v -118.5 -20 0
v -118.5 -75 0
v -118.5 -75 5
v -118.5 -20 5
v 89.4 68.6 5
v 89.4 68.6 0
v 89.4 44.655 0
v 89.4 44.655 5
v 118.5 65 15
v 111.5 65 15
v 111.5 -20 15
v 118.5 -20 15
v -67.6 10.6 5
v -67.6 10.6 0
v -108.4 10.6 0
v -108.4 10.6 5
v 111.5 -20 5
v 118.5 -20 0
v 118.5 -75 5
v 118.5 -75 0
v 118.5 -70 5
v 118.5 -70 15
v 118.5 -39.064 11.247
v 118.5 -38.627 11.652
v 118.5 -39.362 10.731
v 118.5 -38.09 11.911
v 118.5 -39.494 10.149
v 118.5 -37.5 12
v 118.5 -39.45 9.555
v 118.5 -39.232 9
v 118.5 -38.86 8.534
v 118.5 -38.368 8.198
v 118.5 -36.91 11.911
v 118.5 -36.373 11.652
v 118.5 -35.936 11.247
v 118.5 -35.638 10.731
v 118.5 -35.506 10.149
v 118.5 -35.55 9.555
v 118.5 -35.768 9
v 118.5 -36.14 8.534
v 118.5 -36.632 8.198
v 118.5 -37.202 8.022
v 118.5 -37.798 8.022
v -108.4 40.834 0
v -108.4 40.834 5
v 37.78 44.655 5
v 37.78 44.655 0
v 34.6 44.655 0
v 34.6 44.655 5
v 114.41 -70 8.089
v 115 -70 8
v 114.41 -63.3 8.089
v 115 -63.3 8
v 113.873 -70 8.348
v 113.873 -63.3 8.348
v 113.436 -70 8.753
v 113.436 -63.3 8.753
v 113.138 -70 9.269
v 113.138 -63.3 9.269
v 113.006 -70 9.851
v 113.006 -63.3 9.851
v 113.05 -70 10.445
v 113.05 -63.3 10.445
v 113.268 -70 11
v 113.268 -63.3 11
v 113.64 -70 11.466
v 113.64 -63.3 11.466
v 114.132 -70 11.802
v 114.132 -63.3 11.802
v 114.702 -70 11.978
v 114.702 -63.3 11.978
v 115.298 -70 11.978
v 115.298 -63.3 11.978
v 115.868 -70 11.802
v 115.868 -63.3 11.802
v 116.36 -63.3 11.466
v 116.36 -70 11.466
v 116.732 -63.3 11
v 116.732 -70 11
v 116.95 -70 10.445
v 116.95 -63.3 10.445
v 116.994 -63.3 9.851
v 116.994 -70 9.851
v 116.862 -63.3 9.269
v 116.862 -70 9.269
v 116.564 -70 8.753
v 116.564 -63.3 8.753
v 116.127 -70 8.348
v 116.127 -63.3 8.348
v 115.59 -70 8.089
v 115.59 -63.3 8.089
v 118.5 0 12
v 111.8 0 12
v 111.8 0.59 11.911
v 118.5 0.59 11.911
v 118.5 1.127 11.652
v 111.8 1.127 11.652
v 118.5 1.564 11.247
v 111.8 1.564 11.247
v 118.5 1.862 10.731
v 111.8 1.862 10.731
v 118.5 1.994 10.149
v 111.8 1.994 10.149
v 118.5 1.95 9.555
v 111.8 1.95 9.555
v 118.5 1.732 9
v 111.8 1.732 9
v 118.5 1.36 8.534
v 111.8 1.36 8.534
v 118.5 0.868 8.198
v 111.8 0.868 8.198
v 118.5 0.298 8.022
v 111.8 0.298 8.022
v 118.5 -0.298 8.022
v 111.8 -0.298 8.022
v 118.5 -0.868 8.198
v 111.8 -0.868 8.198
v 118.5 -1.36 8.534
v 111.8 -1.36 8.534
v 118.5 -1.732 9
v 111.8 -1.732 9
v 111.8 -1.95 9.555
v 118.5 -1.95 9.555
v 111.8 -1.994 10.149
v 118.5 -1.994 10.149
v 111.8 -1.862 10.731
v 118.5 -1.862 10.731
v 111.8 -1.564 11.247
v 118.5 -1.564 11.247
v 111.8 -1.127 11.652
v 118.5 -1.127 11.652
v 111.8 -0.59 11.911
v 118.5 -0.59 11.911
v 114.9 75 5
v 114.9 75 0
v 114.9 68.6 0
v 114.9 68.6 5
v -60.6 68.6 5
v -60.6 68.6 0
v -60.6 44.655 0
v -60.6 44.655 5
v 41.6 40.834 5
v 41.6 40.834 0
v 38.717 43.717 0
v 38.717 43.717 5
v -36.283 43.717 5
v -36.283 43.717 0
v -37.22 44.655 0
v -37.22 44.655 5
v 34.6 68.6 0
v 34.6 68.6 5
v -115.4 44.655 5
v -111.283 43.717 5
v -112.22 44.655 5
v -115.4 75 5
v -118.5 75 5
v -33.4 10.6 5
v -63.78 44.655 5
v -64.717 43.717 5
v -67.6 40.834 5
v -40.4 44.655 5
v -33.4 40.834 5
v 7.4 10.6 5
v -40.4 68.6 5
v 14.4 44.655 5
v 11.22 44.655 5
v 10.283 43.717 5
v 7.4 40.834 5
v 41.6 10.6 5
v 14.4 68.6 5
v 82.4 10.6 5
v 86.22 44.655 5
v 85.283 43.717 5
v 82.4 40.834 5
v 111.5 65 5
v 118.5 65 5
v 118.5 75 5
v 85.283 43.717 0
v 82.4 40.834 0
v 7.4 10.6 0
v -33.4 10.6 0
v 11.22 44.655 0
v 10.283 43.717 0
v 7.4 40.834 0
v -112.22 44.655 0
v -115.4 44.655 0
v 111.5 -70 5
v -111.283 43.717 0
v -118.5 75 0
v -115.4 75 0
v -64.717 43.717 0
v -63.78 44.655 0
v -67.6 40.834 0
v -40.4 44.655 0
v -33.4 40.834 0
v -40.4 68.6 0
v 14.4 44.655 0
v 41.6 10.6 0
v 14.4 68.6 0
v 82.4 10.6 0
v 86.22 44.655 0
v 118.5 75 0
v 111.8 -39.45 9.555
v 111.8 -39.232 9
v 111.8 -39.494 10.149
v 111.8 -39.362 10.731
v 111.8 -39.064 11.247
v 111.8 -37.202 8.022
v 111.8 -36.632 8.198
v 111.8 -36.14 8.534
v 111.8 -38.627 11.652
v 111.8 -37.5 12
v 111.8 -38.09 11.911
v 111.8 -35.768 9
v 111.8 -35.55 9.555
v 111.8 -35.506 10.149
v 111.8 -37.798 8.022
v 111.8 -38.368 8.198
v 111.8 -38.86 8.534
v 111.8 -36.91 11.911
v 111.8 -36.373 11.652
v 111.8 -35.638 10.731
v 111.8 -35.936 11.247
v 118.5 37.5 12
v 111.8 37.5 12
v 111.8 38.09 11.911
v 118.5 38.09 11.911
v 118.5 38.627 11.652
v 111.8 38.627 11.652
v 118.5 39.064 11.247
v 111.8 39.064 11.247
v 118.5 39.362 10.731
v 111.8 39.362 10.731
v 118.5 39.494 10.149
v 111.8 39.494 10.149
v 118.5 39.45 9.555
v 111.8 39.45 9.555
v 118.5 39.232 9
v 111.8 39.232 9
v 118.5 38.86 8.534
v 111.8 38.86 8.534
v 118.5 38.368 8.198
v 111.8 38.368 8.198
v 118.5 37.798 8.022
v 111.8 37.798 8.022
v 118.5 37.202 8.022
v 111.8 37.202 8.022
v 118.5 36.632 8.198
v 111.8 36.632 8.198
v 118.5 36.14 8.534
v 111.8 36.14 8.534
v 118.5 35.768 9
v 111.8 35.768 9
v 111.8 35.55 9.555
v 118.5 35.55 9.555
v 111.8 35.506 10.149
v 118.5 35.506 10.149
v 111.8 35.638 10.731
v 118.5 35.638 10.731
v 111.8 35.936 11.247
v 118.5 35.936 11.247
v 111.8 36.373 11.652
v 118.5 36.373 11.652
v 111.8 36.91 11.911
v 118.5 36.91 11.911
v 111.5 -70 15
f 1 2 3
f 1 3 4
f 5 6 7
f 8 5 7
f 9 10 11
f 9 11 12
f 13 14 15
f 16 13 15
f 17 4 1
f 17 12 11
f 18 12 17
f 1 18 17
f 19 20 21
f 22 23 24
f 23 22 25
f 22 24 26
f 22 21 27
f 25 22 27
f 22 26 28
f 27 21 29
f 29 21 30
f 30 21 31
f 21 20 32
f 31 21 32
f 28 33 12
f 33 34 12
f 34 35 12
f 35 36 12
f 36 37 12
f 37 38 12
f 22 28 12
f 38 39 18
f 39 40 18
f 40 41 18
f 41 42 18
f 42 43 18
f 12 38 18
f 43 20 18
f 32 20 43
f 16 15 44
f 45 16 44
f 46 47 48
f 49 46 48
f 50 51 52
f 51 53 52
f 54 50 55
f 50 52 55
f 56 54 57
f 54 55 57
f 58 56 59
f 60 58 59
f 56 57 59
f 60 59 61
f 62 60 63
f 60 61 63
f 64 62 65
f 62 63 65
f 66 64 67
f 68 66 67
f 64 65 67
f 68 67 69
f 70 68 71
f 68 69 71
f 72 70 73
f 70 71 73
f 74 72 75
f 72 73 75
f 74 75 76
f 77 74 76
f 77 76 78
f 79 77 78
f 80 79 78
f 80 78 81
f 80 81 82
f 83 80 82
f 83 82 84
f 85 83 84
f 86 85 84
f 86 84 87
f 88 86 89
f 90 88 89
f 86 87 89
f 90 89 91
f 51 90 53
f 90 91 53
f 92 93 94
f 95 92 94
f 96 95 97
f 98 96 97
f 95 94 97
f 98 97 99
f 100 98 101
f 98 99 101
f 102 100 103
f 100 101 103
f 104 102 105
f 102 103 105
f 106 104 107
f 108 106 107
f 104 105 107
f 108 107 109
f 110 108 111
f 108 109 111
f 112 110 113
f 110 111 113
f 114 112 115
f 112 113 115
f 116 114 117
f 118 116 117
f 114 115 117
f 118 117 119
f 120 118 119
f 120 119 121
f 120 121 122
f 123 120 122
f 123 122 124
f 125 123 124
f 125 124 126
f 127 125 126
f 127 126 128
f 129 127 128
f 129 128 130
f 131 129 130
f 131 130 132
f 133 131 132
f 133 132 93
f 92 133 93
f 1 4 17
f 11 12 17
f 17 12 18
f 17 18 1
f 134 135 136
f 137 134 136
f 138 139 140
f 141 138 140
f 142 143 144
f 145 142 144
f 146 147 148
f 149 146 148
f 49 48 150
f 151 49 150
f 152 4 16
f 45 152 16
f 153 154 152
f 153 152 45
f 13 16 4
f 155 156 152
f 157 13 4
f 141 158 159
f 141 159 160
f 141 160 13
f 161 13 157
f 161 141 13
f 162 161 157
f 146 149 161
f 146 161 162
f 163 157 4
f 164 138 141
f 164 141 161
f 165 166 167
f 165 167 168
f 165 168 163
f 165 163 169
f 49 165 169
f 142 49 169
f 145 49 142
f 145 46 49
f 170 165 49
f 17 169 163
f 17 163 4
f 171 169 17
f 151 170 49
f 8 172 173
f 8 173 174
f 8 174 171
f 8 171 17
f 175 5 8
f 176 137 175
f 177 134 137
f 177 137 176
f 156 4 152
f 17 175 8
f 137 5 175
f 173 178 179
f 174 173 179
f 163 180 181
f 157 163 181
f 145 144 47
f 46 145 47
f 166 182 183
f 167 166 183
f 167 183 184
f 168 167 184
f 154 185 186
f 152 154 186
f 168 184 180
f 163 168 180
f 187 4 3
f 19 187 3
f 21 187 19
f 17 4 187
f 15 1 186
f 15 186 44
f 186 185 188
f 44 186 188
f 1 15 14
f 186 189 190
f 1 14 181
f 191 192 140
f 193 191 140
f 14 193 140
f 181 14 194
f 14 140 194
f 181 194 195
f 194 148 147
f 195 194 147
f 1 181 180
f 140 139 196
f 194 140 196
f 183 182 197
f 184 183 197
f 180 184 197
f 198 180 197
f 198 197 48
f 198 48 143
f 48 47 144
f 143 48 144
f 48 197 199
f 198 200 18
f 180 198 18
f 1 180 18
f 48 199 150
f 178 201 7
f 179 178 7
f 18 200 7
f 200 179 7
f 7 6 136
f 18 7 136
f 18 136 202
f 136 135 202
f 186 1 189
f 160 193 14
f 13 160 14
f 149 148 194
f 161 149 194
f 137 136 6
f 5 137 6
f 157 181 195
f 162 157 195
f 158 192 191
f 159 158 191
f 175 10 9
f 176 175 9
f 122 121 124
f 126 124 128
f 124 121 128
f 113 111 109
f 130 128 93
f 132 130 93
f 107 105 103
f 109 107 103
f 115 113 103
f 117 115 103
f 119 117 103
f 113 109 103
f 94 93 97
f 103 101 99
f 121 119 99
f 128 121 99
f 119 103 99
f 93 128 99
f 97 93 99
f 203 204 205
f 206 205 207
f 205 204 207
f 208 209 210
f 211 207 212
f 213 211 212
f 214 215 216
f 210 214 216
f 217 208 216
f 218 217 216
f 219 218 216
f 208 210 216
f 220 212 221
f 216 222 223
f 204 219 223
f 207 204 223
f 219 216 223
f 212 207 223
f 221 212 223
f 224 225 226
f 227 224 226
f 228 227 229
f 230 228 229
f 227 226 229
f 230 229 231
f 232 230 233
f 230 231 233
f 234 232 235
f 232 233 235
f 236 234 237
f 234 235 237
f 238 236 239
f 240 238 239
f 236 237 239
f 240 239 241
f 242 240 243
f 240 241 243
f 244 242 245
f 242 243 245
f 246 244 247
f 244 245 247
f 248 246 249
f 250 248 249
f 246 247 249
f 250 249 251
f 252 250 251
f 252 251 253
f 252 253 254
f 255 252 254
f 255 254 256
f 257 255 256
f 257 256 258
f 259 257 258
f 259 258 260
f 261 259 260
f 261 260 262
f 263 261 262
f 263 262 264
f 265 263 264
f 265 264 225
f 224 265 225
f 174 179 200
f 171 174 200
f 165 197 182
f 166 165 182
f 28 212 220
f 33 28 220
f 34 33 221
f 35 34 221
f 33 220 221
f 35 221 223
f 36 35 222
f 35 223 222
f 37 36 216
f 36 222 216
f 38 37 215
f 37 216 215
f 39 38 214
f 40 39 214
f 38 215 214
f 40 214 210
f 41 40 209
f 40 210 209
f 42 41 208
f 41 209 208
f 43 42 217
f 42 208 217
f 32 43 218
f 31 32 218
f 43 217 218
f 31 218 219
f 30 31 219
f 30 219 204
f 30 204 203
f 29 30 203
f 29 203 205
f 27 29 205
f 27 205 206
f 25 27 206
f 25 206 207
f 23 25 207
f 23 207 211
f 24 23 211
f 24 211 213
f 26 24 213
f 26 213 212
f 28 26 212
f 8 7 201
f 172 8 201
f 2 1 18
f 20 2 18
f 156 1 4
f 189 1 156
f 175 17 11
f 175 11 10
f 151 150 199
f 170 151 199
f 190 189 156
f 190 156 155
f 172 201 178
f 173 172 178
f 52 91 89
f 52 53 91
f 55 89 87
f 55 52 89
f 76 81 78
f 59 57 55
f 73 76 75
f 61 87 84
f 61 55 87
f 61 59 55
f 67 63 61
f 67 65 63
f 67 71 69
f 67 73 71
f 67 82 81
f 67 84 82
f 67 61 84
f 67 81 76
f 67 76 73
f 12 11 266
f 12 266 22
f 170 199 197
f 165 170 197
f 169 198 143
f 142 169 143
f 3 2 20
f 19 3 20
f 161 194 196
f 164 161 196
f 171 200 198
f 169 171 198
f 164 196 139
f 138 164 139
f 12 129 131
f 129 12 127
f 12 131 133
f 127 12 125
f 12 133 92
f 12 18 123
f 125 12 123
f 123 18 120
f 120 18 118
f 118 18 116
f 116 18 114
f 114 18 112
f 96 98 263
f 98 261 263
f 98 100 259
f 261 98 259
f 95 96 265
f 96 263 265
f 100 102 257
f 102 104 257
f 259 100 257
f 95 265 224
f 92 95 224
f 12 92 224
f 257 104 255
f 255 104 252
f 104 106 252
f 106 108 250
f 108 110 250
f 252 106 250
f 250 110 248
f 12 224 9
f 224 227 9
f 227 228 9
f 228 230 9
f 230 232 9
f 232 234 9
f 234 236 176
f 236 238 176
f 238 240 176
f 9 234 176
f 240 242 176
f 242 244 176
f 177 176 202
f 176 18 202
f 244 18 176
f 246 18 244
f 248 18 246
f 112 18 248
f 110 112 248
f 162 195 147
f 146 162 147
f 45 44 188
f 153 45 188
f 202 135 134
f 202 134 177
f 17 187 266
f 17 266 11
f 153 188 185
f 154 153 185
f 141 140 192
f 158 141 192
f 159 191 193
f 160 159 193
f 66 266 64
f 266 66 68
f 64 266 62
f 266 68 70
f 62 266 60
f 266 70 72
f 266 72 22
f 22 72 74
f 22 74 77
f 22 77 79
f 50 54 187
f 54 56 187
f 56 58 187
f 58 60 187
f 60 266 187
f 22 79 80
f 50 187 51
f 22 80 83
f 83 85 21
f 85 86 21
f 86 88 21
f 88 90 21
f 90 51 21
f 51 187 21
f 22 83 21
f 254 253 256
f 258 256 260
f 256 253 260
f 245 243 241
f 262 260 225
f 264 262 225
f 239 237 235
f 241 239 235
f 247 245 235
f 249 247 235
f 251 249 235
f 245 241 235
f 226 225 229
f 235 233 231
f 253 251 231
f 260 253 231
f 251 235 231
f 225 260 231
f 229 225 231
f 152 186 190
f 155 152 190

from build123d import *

# Parameters (mm, degrees)
SZKIC1_W                    = 237
SZKIC1_H                    = 150
DODANIE_WYCI_GNI_CIE1_DEPTH = 5
SZKIC2_W                    = 7
SZKIC2_H                    = 135
DODANIE_WYCI_GNI_CIE2_DEPTH = 10
OTW_R_4_0_4_1_D             = 4
OTW_R_4_0_4_1_DEPTH         = 6.7
WYTNIJ_WYCI_GNI_CIE1_REACH  = 143.04
SZKIC7_W                    = 2
SZKIC7_H                    = 6.7


with BuildPart() as part:
    # Szkic1 → Dodanie-wyciągnięcie1 (new body)
    with BuildSketch(Plane.XY):
        Rectangle(SZKIC1_W, SZKIC1_H)
    extrude(amount=DODANIE_WYCI_GNI_CIE1_DEPTH)

    # Szkic2 → Dodanie-wyciągnięcie2 (add)
    with BuildSketch(Plane.XY.offset(5)):
        with Locations((115, -2.5)):
            Rectangle(SZKIC2_W, SZKIC2_H)
    extrude(amount=DODANIE_WYCI_GNI_CIE2_DEPTH)

    # Otwór Ø4.0 (4)1
    with Locations(Plane(origin=(118.5, 0, 0), x_dir=(0, 0, -1), z_dir=(1, 0, 0))):
        with Locations((-10, -37.5), (-10, 37.5), (-10, 0)):
            Hole(OTW_R_4_0_4_1_D / 2, depth=OTW_R_4_0_4_1_DEPTH)

    # Szkic5 → Wytnij-wyciągnięcie1 (cut, up to next)
    with BuildSketch(Plane(origin=(0, 0, 0), x_dir=(-1, 0, 0), z_dir=(0, 0, -1)), mode=Mode.PRIVATE) as wytnij_wyci_gni_cie1_sk1:
        Polygon((-82.4, 10.6), (-41.6, 10.6), (-41.6, 40.834314575), (-38.717157288, 43.717157288), (-37.779678569, 44.654636006), (-34.6, 44.654636006), (-34.6, 65), (-34.6, 68.6), (-14.4, 68.6), (-14.4, 65), (-14.4, 44.654636006), (-11.220321431, 44.654636006), (-10.282842712, 43.717157288), (-7.4, 40.834314575), (-7.4, 10.6), (33.4, 10.6), (33.4, 40.834314575), (36.282842712, 43.717157288), (37.220321431, 44.654636006), (40.4, 44.654636006), (40.4, 65), (40.4, 68.6), (60.6, 68.6), (60.6, 65), (60.6, 44.654636006), (63.779678569, 44.654636006), (64.717157288, 43.717157288), (67.6, 40.834314575), (67.6, 10.6), (108.4, 10.6), (108.4, 40.834314575), (111.282842712, 43.717157288), (112.220321431, 44.654636006), (115.4, 44.654636006), (115.4, 65), (115.4, 75.4), (65.5, 75.4), (35.5, 75.4), (-9.5, 75.4), (-39.5, 75.4), (-84.5, 75.4), (-114.9, 75.4), (-114.9, 68.6), (-89.4, 68.6), (-89.4, 65), (-89.4, 44.654636006), (-86.220321431, 44.654636006), (-85.282842712, 43.717157288), (-82.4, 40.834314575), align=None)
        Polygon((-86, 45.054636006), (-86, 45), (-85, 44), (-82, 41), (-82, 11), (-42, 11), (-42, 41), (-39, 44), (-38, 45), (-38, 45.054636006), (-35, 45.054636006), (-35, 65), (-35, 69), (-14, 69), (-14, 65), (-14, 45.054636006), (-11, 45.054636006), (-11, 45), (-10, 44), (-7, 41), (-7, 11), (33, 11), (33, 41), (36, 44), (37, 45), (37, 45.054636006), (40, 45.054636006), (40, 65), (40, 69), (61, 69), (61, 65), (61, 45.054636006), (64, 45.054636006), (64, 45), (65, 44), (68, 41), (68, 11), (108, 11), (108, 41), (111, 44), (112, 45), (112, 45.054636006), (115, 45.054636006), (115, 65), (115, 75), (65.5, 75), (35.5, 75), (-9.5, 75), (-39.5, 75), (-84.5, 75), (-114.5, 75), (-114.5, 69), (-89, 69), (-89, 65), (-89, 45.054636006), align=None, mode=Mode.SUBTRACT)
    wytnij_wyci_gni_cie1_tool1 = extrude(wytnij_wyci_gni_cie1_sk1.sketch, amount=-WYTNIJ_WYCI_GNI_CIE1_REACH, mode=Mode.PRIVATE) & part.part
    add(wytnij_wyci_gni_cie1_tool1.solids().sort_by_distance((62, 10.839243, 0))[0], mode=Mode.SUBTRACT)


with BuildPart() as wytnij_wyci_gni_cie1_kept_piece:
    # of the separate pieces the step leaves, the one the design keeps (wytnij_wyci_gni_cie1_pieces_kept)
    add(part.part.solids().sort_by_distance((-118.5, -75, 0))[0])


with BuildPart() as body_2:
    # Podziel1: the piece on the far side of the plane
    add(wytnij_wyci_gni_cie1_kept_piece.part)
    split(bisect_by=Plane(origin=(0, -20, 0), x_dir=(0, 0, -1), z_dir=(0, -1, 0)), keep=Keep.BOTTOM)


with BuildPart() as wytnij_wyci_gni_cie1_kept_piece_1:
    add(wytnij_wyci_gni_cie1_kept_piece.part)

    # Podziel1
    split(bisect_by=Plane(origin=(0, -20, 0), x_dir=(0, 0, -1), z_dir=(0, -1, 0)), keep=Keep.TOP)

    # Szkic7 → Otwory ustalające Ø4.0mm1 (revolve, cut)
    with BuildSketch(Plane(origin=(115, -70, 10), x_dir=(0, 0, -1), z_dir=(1, 0, 0))):
        with Locations((1, 3.35)):
            Rectangle(SZKIC7_W, SZKIC7_H)
    revolve(axis=Axis((115, -76.35, 10), (0, 1, 0)), mode=Mode.SUBTRACT)


solid = Compound([body_2.part, wytnij_wyci_gni_cie1_kept_piece_1.part])
